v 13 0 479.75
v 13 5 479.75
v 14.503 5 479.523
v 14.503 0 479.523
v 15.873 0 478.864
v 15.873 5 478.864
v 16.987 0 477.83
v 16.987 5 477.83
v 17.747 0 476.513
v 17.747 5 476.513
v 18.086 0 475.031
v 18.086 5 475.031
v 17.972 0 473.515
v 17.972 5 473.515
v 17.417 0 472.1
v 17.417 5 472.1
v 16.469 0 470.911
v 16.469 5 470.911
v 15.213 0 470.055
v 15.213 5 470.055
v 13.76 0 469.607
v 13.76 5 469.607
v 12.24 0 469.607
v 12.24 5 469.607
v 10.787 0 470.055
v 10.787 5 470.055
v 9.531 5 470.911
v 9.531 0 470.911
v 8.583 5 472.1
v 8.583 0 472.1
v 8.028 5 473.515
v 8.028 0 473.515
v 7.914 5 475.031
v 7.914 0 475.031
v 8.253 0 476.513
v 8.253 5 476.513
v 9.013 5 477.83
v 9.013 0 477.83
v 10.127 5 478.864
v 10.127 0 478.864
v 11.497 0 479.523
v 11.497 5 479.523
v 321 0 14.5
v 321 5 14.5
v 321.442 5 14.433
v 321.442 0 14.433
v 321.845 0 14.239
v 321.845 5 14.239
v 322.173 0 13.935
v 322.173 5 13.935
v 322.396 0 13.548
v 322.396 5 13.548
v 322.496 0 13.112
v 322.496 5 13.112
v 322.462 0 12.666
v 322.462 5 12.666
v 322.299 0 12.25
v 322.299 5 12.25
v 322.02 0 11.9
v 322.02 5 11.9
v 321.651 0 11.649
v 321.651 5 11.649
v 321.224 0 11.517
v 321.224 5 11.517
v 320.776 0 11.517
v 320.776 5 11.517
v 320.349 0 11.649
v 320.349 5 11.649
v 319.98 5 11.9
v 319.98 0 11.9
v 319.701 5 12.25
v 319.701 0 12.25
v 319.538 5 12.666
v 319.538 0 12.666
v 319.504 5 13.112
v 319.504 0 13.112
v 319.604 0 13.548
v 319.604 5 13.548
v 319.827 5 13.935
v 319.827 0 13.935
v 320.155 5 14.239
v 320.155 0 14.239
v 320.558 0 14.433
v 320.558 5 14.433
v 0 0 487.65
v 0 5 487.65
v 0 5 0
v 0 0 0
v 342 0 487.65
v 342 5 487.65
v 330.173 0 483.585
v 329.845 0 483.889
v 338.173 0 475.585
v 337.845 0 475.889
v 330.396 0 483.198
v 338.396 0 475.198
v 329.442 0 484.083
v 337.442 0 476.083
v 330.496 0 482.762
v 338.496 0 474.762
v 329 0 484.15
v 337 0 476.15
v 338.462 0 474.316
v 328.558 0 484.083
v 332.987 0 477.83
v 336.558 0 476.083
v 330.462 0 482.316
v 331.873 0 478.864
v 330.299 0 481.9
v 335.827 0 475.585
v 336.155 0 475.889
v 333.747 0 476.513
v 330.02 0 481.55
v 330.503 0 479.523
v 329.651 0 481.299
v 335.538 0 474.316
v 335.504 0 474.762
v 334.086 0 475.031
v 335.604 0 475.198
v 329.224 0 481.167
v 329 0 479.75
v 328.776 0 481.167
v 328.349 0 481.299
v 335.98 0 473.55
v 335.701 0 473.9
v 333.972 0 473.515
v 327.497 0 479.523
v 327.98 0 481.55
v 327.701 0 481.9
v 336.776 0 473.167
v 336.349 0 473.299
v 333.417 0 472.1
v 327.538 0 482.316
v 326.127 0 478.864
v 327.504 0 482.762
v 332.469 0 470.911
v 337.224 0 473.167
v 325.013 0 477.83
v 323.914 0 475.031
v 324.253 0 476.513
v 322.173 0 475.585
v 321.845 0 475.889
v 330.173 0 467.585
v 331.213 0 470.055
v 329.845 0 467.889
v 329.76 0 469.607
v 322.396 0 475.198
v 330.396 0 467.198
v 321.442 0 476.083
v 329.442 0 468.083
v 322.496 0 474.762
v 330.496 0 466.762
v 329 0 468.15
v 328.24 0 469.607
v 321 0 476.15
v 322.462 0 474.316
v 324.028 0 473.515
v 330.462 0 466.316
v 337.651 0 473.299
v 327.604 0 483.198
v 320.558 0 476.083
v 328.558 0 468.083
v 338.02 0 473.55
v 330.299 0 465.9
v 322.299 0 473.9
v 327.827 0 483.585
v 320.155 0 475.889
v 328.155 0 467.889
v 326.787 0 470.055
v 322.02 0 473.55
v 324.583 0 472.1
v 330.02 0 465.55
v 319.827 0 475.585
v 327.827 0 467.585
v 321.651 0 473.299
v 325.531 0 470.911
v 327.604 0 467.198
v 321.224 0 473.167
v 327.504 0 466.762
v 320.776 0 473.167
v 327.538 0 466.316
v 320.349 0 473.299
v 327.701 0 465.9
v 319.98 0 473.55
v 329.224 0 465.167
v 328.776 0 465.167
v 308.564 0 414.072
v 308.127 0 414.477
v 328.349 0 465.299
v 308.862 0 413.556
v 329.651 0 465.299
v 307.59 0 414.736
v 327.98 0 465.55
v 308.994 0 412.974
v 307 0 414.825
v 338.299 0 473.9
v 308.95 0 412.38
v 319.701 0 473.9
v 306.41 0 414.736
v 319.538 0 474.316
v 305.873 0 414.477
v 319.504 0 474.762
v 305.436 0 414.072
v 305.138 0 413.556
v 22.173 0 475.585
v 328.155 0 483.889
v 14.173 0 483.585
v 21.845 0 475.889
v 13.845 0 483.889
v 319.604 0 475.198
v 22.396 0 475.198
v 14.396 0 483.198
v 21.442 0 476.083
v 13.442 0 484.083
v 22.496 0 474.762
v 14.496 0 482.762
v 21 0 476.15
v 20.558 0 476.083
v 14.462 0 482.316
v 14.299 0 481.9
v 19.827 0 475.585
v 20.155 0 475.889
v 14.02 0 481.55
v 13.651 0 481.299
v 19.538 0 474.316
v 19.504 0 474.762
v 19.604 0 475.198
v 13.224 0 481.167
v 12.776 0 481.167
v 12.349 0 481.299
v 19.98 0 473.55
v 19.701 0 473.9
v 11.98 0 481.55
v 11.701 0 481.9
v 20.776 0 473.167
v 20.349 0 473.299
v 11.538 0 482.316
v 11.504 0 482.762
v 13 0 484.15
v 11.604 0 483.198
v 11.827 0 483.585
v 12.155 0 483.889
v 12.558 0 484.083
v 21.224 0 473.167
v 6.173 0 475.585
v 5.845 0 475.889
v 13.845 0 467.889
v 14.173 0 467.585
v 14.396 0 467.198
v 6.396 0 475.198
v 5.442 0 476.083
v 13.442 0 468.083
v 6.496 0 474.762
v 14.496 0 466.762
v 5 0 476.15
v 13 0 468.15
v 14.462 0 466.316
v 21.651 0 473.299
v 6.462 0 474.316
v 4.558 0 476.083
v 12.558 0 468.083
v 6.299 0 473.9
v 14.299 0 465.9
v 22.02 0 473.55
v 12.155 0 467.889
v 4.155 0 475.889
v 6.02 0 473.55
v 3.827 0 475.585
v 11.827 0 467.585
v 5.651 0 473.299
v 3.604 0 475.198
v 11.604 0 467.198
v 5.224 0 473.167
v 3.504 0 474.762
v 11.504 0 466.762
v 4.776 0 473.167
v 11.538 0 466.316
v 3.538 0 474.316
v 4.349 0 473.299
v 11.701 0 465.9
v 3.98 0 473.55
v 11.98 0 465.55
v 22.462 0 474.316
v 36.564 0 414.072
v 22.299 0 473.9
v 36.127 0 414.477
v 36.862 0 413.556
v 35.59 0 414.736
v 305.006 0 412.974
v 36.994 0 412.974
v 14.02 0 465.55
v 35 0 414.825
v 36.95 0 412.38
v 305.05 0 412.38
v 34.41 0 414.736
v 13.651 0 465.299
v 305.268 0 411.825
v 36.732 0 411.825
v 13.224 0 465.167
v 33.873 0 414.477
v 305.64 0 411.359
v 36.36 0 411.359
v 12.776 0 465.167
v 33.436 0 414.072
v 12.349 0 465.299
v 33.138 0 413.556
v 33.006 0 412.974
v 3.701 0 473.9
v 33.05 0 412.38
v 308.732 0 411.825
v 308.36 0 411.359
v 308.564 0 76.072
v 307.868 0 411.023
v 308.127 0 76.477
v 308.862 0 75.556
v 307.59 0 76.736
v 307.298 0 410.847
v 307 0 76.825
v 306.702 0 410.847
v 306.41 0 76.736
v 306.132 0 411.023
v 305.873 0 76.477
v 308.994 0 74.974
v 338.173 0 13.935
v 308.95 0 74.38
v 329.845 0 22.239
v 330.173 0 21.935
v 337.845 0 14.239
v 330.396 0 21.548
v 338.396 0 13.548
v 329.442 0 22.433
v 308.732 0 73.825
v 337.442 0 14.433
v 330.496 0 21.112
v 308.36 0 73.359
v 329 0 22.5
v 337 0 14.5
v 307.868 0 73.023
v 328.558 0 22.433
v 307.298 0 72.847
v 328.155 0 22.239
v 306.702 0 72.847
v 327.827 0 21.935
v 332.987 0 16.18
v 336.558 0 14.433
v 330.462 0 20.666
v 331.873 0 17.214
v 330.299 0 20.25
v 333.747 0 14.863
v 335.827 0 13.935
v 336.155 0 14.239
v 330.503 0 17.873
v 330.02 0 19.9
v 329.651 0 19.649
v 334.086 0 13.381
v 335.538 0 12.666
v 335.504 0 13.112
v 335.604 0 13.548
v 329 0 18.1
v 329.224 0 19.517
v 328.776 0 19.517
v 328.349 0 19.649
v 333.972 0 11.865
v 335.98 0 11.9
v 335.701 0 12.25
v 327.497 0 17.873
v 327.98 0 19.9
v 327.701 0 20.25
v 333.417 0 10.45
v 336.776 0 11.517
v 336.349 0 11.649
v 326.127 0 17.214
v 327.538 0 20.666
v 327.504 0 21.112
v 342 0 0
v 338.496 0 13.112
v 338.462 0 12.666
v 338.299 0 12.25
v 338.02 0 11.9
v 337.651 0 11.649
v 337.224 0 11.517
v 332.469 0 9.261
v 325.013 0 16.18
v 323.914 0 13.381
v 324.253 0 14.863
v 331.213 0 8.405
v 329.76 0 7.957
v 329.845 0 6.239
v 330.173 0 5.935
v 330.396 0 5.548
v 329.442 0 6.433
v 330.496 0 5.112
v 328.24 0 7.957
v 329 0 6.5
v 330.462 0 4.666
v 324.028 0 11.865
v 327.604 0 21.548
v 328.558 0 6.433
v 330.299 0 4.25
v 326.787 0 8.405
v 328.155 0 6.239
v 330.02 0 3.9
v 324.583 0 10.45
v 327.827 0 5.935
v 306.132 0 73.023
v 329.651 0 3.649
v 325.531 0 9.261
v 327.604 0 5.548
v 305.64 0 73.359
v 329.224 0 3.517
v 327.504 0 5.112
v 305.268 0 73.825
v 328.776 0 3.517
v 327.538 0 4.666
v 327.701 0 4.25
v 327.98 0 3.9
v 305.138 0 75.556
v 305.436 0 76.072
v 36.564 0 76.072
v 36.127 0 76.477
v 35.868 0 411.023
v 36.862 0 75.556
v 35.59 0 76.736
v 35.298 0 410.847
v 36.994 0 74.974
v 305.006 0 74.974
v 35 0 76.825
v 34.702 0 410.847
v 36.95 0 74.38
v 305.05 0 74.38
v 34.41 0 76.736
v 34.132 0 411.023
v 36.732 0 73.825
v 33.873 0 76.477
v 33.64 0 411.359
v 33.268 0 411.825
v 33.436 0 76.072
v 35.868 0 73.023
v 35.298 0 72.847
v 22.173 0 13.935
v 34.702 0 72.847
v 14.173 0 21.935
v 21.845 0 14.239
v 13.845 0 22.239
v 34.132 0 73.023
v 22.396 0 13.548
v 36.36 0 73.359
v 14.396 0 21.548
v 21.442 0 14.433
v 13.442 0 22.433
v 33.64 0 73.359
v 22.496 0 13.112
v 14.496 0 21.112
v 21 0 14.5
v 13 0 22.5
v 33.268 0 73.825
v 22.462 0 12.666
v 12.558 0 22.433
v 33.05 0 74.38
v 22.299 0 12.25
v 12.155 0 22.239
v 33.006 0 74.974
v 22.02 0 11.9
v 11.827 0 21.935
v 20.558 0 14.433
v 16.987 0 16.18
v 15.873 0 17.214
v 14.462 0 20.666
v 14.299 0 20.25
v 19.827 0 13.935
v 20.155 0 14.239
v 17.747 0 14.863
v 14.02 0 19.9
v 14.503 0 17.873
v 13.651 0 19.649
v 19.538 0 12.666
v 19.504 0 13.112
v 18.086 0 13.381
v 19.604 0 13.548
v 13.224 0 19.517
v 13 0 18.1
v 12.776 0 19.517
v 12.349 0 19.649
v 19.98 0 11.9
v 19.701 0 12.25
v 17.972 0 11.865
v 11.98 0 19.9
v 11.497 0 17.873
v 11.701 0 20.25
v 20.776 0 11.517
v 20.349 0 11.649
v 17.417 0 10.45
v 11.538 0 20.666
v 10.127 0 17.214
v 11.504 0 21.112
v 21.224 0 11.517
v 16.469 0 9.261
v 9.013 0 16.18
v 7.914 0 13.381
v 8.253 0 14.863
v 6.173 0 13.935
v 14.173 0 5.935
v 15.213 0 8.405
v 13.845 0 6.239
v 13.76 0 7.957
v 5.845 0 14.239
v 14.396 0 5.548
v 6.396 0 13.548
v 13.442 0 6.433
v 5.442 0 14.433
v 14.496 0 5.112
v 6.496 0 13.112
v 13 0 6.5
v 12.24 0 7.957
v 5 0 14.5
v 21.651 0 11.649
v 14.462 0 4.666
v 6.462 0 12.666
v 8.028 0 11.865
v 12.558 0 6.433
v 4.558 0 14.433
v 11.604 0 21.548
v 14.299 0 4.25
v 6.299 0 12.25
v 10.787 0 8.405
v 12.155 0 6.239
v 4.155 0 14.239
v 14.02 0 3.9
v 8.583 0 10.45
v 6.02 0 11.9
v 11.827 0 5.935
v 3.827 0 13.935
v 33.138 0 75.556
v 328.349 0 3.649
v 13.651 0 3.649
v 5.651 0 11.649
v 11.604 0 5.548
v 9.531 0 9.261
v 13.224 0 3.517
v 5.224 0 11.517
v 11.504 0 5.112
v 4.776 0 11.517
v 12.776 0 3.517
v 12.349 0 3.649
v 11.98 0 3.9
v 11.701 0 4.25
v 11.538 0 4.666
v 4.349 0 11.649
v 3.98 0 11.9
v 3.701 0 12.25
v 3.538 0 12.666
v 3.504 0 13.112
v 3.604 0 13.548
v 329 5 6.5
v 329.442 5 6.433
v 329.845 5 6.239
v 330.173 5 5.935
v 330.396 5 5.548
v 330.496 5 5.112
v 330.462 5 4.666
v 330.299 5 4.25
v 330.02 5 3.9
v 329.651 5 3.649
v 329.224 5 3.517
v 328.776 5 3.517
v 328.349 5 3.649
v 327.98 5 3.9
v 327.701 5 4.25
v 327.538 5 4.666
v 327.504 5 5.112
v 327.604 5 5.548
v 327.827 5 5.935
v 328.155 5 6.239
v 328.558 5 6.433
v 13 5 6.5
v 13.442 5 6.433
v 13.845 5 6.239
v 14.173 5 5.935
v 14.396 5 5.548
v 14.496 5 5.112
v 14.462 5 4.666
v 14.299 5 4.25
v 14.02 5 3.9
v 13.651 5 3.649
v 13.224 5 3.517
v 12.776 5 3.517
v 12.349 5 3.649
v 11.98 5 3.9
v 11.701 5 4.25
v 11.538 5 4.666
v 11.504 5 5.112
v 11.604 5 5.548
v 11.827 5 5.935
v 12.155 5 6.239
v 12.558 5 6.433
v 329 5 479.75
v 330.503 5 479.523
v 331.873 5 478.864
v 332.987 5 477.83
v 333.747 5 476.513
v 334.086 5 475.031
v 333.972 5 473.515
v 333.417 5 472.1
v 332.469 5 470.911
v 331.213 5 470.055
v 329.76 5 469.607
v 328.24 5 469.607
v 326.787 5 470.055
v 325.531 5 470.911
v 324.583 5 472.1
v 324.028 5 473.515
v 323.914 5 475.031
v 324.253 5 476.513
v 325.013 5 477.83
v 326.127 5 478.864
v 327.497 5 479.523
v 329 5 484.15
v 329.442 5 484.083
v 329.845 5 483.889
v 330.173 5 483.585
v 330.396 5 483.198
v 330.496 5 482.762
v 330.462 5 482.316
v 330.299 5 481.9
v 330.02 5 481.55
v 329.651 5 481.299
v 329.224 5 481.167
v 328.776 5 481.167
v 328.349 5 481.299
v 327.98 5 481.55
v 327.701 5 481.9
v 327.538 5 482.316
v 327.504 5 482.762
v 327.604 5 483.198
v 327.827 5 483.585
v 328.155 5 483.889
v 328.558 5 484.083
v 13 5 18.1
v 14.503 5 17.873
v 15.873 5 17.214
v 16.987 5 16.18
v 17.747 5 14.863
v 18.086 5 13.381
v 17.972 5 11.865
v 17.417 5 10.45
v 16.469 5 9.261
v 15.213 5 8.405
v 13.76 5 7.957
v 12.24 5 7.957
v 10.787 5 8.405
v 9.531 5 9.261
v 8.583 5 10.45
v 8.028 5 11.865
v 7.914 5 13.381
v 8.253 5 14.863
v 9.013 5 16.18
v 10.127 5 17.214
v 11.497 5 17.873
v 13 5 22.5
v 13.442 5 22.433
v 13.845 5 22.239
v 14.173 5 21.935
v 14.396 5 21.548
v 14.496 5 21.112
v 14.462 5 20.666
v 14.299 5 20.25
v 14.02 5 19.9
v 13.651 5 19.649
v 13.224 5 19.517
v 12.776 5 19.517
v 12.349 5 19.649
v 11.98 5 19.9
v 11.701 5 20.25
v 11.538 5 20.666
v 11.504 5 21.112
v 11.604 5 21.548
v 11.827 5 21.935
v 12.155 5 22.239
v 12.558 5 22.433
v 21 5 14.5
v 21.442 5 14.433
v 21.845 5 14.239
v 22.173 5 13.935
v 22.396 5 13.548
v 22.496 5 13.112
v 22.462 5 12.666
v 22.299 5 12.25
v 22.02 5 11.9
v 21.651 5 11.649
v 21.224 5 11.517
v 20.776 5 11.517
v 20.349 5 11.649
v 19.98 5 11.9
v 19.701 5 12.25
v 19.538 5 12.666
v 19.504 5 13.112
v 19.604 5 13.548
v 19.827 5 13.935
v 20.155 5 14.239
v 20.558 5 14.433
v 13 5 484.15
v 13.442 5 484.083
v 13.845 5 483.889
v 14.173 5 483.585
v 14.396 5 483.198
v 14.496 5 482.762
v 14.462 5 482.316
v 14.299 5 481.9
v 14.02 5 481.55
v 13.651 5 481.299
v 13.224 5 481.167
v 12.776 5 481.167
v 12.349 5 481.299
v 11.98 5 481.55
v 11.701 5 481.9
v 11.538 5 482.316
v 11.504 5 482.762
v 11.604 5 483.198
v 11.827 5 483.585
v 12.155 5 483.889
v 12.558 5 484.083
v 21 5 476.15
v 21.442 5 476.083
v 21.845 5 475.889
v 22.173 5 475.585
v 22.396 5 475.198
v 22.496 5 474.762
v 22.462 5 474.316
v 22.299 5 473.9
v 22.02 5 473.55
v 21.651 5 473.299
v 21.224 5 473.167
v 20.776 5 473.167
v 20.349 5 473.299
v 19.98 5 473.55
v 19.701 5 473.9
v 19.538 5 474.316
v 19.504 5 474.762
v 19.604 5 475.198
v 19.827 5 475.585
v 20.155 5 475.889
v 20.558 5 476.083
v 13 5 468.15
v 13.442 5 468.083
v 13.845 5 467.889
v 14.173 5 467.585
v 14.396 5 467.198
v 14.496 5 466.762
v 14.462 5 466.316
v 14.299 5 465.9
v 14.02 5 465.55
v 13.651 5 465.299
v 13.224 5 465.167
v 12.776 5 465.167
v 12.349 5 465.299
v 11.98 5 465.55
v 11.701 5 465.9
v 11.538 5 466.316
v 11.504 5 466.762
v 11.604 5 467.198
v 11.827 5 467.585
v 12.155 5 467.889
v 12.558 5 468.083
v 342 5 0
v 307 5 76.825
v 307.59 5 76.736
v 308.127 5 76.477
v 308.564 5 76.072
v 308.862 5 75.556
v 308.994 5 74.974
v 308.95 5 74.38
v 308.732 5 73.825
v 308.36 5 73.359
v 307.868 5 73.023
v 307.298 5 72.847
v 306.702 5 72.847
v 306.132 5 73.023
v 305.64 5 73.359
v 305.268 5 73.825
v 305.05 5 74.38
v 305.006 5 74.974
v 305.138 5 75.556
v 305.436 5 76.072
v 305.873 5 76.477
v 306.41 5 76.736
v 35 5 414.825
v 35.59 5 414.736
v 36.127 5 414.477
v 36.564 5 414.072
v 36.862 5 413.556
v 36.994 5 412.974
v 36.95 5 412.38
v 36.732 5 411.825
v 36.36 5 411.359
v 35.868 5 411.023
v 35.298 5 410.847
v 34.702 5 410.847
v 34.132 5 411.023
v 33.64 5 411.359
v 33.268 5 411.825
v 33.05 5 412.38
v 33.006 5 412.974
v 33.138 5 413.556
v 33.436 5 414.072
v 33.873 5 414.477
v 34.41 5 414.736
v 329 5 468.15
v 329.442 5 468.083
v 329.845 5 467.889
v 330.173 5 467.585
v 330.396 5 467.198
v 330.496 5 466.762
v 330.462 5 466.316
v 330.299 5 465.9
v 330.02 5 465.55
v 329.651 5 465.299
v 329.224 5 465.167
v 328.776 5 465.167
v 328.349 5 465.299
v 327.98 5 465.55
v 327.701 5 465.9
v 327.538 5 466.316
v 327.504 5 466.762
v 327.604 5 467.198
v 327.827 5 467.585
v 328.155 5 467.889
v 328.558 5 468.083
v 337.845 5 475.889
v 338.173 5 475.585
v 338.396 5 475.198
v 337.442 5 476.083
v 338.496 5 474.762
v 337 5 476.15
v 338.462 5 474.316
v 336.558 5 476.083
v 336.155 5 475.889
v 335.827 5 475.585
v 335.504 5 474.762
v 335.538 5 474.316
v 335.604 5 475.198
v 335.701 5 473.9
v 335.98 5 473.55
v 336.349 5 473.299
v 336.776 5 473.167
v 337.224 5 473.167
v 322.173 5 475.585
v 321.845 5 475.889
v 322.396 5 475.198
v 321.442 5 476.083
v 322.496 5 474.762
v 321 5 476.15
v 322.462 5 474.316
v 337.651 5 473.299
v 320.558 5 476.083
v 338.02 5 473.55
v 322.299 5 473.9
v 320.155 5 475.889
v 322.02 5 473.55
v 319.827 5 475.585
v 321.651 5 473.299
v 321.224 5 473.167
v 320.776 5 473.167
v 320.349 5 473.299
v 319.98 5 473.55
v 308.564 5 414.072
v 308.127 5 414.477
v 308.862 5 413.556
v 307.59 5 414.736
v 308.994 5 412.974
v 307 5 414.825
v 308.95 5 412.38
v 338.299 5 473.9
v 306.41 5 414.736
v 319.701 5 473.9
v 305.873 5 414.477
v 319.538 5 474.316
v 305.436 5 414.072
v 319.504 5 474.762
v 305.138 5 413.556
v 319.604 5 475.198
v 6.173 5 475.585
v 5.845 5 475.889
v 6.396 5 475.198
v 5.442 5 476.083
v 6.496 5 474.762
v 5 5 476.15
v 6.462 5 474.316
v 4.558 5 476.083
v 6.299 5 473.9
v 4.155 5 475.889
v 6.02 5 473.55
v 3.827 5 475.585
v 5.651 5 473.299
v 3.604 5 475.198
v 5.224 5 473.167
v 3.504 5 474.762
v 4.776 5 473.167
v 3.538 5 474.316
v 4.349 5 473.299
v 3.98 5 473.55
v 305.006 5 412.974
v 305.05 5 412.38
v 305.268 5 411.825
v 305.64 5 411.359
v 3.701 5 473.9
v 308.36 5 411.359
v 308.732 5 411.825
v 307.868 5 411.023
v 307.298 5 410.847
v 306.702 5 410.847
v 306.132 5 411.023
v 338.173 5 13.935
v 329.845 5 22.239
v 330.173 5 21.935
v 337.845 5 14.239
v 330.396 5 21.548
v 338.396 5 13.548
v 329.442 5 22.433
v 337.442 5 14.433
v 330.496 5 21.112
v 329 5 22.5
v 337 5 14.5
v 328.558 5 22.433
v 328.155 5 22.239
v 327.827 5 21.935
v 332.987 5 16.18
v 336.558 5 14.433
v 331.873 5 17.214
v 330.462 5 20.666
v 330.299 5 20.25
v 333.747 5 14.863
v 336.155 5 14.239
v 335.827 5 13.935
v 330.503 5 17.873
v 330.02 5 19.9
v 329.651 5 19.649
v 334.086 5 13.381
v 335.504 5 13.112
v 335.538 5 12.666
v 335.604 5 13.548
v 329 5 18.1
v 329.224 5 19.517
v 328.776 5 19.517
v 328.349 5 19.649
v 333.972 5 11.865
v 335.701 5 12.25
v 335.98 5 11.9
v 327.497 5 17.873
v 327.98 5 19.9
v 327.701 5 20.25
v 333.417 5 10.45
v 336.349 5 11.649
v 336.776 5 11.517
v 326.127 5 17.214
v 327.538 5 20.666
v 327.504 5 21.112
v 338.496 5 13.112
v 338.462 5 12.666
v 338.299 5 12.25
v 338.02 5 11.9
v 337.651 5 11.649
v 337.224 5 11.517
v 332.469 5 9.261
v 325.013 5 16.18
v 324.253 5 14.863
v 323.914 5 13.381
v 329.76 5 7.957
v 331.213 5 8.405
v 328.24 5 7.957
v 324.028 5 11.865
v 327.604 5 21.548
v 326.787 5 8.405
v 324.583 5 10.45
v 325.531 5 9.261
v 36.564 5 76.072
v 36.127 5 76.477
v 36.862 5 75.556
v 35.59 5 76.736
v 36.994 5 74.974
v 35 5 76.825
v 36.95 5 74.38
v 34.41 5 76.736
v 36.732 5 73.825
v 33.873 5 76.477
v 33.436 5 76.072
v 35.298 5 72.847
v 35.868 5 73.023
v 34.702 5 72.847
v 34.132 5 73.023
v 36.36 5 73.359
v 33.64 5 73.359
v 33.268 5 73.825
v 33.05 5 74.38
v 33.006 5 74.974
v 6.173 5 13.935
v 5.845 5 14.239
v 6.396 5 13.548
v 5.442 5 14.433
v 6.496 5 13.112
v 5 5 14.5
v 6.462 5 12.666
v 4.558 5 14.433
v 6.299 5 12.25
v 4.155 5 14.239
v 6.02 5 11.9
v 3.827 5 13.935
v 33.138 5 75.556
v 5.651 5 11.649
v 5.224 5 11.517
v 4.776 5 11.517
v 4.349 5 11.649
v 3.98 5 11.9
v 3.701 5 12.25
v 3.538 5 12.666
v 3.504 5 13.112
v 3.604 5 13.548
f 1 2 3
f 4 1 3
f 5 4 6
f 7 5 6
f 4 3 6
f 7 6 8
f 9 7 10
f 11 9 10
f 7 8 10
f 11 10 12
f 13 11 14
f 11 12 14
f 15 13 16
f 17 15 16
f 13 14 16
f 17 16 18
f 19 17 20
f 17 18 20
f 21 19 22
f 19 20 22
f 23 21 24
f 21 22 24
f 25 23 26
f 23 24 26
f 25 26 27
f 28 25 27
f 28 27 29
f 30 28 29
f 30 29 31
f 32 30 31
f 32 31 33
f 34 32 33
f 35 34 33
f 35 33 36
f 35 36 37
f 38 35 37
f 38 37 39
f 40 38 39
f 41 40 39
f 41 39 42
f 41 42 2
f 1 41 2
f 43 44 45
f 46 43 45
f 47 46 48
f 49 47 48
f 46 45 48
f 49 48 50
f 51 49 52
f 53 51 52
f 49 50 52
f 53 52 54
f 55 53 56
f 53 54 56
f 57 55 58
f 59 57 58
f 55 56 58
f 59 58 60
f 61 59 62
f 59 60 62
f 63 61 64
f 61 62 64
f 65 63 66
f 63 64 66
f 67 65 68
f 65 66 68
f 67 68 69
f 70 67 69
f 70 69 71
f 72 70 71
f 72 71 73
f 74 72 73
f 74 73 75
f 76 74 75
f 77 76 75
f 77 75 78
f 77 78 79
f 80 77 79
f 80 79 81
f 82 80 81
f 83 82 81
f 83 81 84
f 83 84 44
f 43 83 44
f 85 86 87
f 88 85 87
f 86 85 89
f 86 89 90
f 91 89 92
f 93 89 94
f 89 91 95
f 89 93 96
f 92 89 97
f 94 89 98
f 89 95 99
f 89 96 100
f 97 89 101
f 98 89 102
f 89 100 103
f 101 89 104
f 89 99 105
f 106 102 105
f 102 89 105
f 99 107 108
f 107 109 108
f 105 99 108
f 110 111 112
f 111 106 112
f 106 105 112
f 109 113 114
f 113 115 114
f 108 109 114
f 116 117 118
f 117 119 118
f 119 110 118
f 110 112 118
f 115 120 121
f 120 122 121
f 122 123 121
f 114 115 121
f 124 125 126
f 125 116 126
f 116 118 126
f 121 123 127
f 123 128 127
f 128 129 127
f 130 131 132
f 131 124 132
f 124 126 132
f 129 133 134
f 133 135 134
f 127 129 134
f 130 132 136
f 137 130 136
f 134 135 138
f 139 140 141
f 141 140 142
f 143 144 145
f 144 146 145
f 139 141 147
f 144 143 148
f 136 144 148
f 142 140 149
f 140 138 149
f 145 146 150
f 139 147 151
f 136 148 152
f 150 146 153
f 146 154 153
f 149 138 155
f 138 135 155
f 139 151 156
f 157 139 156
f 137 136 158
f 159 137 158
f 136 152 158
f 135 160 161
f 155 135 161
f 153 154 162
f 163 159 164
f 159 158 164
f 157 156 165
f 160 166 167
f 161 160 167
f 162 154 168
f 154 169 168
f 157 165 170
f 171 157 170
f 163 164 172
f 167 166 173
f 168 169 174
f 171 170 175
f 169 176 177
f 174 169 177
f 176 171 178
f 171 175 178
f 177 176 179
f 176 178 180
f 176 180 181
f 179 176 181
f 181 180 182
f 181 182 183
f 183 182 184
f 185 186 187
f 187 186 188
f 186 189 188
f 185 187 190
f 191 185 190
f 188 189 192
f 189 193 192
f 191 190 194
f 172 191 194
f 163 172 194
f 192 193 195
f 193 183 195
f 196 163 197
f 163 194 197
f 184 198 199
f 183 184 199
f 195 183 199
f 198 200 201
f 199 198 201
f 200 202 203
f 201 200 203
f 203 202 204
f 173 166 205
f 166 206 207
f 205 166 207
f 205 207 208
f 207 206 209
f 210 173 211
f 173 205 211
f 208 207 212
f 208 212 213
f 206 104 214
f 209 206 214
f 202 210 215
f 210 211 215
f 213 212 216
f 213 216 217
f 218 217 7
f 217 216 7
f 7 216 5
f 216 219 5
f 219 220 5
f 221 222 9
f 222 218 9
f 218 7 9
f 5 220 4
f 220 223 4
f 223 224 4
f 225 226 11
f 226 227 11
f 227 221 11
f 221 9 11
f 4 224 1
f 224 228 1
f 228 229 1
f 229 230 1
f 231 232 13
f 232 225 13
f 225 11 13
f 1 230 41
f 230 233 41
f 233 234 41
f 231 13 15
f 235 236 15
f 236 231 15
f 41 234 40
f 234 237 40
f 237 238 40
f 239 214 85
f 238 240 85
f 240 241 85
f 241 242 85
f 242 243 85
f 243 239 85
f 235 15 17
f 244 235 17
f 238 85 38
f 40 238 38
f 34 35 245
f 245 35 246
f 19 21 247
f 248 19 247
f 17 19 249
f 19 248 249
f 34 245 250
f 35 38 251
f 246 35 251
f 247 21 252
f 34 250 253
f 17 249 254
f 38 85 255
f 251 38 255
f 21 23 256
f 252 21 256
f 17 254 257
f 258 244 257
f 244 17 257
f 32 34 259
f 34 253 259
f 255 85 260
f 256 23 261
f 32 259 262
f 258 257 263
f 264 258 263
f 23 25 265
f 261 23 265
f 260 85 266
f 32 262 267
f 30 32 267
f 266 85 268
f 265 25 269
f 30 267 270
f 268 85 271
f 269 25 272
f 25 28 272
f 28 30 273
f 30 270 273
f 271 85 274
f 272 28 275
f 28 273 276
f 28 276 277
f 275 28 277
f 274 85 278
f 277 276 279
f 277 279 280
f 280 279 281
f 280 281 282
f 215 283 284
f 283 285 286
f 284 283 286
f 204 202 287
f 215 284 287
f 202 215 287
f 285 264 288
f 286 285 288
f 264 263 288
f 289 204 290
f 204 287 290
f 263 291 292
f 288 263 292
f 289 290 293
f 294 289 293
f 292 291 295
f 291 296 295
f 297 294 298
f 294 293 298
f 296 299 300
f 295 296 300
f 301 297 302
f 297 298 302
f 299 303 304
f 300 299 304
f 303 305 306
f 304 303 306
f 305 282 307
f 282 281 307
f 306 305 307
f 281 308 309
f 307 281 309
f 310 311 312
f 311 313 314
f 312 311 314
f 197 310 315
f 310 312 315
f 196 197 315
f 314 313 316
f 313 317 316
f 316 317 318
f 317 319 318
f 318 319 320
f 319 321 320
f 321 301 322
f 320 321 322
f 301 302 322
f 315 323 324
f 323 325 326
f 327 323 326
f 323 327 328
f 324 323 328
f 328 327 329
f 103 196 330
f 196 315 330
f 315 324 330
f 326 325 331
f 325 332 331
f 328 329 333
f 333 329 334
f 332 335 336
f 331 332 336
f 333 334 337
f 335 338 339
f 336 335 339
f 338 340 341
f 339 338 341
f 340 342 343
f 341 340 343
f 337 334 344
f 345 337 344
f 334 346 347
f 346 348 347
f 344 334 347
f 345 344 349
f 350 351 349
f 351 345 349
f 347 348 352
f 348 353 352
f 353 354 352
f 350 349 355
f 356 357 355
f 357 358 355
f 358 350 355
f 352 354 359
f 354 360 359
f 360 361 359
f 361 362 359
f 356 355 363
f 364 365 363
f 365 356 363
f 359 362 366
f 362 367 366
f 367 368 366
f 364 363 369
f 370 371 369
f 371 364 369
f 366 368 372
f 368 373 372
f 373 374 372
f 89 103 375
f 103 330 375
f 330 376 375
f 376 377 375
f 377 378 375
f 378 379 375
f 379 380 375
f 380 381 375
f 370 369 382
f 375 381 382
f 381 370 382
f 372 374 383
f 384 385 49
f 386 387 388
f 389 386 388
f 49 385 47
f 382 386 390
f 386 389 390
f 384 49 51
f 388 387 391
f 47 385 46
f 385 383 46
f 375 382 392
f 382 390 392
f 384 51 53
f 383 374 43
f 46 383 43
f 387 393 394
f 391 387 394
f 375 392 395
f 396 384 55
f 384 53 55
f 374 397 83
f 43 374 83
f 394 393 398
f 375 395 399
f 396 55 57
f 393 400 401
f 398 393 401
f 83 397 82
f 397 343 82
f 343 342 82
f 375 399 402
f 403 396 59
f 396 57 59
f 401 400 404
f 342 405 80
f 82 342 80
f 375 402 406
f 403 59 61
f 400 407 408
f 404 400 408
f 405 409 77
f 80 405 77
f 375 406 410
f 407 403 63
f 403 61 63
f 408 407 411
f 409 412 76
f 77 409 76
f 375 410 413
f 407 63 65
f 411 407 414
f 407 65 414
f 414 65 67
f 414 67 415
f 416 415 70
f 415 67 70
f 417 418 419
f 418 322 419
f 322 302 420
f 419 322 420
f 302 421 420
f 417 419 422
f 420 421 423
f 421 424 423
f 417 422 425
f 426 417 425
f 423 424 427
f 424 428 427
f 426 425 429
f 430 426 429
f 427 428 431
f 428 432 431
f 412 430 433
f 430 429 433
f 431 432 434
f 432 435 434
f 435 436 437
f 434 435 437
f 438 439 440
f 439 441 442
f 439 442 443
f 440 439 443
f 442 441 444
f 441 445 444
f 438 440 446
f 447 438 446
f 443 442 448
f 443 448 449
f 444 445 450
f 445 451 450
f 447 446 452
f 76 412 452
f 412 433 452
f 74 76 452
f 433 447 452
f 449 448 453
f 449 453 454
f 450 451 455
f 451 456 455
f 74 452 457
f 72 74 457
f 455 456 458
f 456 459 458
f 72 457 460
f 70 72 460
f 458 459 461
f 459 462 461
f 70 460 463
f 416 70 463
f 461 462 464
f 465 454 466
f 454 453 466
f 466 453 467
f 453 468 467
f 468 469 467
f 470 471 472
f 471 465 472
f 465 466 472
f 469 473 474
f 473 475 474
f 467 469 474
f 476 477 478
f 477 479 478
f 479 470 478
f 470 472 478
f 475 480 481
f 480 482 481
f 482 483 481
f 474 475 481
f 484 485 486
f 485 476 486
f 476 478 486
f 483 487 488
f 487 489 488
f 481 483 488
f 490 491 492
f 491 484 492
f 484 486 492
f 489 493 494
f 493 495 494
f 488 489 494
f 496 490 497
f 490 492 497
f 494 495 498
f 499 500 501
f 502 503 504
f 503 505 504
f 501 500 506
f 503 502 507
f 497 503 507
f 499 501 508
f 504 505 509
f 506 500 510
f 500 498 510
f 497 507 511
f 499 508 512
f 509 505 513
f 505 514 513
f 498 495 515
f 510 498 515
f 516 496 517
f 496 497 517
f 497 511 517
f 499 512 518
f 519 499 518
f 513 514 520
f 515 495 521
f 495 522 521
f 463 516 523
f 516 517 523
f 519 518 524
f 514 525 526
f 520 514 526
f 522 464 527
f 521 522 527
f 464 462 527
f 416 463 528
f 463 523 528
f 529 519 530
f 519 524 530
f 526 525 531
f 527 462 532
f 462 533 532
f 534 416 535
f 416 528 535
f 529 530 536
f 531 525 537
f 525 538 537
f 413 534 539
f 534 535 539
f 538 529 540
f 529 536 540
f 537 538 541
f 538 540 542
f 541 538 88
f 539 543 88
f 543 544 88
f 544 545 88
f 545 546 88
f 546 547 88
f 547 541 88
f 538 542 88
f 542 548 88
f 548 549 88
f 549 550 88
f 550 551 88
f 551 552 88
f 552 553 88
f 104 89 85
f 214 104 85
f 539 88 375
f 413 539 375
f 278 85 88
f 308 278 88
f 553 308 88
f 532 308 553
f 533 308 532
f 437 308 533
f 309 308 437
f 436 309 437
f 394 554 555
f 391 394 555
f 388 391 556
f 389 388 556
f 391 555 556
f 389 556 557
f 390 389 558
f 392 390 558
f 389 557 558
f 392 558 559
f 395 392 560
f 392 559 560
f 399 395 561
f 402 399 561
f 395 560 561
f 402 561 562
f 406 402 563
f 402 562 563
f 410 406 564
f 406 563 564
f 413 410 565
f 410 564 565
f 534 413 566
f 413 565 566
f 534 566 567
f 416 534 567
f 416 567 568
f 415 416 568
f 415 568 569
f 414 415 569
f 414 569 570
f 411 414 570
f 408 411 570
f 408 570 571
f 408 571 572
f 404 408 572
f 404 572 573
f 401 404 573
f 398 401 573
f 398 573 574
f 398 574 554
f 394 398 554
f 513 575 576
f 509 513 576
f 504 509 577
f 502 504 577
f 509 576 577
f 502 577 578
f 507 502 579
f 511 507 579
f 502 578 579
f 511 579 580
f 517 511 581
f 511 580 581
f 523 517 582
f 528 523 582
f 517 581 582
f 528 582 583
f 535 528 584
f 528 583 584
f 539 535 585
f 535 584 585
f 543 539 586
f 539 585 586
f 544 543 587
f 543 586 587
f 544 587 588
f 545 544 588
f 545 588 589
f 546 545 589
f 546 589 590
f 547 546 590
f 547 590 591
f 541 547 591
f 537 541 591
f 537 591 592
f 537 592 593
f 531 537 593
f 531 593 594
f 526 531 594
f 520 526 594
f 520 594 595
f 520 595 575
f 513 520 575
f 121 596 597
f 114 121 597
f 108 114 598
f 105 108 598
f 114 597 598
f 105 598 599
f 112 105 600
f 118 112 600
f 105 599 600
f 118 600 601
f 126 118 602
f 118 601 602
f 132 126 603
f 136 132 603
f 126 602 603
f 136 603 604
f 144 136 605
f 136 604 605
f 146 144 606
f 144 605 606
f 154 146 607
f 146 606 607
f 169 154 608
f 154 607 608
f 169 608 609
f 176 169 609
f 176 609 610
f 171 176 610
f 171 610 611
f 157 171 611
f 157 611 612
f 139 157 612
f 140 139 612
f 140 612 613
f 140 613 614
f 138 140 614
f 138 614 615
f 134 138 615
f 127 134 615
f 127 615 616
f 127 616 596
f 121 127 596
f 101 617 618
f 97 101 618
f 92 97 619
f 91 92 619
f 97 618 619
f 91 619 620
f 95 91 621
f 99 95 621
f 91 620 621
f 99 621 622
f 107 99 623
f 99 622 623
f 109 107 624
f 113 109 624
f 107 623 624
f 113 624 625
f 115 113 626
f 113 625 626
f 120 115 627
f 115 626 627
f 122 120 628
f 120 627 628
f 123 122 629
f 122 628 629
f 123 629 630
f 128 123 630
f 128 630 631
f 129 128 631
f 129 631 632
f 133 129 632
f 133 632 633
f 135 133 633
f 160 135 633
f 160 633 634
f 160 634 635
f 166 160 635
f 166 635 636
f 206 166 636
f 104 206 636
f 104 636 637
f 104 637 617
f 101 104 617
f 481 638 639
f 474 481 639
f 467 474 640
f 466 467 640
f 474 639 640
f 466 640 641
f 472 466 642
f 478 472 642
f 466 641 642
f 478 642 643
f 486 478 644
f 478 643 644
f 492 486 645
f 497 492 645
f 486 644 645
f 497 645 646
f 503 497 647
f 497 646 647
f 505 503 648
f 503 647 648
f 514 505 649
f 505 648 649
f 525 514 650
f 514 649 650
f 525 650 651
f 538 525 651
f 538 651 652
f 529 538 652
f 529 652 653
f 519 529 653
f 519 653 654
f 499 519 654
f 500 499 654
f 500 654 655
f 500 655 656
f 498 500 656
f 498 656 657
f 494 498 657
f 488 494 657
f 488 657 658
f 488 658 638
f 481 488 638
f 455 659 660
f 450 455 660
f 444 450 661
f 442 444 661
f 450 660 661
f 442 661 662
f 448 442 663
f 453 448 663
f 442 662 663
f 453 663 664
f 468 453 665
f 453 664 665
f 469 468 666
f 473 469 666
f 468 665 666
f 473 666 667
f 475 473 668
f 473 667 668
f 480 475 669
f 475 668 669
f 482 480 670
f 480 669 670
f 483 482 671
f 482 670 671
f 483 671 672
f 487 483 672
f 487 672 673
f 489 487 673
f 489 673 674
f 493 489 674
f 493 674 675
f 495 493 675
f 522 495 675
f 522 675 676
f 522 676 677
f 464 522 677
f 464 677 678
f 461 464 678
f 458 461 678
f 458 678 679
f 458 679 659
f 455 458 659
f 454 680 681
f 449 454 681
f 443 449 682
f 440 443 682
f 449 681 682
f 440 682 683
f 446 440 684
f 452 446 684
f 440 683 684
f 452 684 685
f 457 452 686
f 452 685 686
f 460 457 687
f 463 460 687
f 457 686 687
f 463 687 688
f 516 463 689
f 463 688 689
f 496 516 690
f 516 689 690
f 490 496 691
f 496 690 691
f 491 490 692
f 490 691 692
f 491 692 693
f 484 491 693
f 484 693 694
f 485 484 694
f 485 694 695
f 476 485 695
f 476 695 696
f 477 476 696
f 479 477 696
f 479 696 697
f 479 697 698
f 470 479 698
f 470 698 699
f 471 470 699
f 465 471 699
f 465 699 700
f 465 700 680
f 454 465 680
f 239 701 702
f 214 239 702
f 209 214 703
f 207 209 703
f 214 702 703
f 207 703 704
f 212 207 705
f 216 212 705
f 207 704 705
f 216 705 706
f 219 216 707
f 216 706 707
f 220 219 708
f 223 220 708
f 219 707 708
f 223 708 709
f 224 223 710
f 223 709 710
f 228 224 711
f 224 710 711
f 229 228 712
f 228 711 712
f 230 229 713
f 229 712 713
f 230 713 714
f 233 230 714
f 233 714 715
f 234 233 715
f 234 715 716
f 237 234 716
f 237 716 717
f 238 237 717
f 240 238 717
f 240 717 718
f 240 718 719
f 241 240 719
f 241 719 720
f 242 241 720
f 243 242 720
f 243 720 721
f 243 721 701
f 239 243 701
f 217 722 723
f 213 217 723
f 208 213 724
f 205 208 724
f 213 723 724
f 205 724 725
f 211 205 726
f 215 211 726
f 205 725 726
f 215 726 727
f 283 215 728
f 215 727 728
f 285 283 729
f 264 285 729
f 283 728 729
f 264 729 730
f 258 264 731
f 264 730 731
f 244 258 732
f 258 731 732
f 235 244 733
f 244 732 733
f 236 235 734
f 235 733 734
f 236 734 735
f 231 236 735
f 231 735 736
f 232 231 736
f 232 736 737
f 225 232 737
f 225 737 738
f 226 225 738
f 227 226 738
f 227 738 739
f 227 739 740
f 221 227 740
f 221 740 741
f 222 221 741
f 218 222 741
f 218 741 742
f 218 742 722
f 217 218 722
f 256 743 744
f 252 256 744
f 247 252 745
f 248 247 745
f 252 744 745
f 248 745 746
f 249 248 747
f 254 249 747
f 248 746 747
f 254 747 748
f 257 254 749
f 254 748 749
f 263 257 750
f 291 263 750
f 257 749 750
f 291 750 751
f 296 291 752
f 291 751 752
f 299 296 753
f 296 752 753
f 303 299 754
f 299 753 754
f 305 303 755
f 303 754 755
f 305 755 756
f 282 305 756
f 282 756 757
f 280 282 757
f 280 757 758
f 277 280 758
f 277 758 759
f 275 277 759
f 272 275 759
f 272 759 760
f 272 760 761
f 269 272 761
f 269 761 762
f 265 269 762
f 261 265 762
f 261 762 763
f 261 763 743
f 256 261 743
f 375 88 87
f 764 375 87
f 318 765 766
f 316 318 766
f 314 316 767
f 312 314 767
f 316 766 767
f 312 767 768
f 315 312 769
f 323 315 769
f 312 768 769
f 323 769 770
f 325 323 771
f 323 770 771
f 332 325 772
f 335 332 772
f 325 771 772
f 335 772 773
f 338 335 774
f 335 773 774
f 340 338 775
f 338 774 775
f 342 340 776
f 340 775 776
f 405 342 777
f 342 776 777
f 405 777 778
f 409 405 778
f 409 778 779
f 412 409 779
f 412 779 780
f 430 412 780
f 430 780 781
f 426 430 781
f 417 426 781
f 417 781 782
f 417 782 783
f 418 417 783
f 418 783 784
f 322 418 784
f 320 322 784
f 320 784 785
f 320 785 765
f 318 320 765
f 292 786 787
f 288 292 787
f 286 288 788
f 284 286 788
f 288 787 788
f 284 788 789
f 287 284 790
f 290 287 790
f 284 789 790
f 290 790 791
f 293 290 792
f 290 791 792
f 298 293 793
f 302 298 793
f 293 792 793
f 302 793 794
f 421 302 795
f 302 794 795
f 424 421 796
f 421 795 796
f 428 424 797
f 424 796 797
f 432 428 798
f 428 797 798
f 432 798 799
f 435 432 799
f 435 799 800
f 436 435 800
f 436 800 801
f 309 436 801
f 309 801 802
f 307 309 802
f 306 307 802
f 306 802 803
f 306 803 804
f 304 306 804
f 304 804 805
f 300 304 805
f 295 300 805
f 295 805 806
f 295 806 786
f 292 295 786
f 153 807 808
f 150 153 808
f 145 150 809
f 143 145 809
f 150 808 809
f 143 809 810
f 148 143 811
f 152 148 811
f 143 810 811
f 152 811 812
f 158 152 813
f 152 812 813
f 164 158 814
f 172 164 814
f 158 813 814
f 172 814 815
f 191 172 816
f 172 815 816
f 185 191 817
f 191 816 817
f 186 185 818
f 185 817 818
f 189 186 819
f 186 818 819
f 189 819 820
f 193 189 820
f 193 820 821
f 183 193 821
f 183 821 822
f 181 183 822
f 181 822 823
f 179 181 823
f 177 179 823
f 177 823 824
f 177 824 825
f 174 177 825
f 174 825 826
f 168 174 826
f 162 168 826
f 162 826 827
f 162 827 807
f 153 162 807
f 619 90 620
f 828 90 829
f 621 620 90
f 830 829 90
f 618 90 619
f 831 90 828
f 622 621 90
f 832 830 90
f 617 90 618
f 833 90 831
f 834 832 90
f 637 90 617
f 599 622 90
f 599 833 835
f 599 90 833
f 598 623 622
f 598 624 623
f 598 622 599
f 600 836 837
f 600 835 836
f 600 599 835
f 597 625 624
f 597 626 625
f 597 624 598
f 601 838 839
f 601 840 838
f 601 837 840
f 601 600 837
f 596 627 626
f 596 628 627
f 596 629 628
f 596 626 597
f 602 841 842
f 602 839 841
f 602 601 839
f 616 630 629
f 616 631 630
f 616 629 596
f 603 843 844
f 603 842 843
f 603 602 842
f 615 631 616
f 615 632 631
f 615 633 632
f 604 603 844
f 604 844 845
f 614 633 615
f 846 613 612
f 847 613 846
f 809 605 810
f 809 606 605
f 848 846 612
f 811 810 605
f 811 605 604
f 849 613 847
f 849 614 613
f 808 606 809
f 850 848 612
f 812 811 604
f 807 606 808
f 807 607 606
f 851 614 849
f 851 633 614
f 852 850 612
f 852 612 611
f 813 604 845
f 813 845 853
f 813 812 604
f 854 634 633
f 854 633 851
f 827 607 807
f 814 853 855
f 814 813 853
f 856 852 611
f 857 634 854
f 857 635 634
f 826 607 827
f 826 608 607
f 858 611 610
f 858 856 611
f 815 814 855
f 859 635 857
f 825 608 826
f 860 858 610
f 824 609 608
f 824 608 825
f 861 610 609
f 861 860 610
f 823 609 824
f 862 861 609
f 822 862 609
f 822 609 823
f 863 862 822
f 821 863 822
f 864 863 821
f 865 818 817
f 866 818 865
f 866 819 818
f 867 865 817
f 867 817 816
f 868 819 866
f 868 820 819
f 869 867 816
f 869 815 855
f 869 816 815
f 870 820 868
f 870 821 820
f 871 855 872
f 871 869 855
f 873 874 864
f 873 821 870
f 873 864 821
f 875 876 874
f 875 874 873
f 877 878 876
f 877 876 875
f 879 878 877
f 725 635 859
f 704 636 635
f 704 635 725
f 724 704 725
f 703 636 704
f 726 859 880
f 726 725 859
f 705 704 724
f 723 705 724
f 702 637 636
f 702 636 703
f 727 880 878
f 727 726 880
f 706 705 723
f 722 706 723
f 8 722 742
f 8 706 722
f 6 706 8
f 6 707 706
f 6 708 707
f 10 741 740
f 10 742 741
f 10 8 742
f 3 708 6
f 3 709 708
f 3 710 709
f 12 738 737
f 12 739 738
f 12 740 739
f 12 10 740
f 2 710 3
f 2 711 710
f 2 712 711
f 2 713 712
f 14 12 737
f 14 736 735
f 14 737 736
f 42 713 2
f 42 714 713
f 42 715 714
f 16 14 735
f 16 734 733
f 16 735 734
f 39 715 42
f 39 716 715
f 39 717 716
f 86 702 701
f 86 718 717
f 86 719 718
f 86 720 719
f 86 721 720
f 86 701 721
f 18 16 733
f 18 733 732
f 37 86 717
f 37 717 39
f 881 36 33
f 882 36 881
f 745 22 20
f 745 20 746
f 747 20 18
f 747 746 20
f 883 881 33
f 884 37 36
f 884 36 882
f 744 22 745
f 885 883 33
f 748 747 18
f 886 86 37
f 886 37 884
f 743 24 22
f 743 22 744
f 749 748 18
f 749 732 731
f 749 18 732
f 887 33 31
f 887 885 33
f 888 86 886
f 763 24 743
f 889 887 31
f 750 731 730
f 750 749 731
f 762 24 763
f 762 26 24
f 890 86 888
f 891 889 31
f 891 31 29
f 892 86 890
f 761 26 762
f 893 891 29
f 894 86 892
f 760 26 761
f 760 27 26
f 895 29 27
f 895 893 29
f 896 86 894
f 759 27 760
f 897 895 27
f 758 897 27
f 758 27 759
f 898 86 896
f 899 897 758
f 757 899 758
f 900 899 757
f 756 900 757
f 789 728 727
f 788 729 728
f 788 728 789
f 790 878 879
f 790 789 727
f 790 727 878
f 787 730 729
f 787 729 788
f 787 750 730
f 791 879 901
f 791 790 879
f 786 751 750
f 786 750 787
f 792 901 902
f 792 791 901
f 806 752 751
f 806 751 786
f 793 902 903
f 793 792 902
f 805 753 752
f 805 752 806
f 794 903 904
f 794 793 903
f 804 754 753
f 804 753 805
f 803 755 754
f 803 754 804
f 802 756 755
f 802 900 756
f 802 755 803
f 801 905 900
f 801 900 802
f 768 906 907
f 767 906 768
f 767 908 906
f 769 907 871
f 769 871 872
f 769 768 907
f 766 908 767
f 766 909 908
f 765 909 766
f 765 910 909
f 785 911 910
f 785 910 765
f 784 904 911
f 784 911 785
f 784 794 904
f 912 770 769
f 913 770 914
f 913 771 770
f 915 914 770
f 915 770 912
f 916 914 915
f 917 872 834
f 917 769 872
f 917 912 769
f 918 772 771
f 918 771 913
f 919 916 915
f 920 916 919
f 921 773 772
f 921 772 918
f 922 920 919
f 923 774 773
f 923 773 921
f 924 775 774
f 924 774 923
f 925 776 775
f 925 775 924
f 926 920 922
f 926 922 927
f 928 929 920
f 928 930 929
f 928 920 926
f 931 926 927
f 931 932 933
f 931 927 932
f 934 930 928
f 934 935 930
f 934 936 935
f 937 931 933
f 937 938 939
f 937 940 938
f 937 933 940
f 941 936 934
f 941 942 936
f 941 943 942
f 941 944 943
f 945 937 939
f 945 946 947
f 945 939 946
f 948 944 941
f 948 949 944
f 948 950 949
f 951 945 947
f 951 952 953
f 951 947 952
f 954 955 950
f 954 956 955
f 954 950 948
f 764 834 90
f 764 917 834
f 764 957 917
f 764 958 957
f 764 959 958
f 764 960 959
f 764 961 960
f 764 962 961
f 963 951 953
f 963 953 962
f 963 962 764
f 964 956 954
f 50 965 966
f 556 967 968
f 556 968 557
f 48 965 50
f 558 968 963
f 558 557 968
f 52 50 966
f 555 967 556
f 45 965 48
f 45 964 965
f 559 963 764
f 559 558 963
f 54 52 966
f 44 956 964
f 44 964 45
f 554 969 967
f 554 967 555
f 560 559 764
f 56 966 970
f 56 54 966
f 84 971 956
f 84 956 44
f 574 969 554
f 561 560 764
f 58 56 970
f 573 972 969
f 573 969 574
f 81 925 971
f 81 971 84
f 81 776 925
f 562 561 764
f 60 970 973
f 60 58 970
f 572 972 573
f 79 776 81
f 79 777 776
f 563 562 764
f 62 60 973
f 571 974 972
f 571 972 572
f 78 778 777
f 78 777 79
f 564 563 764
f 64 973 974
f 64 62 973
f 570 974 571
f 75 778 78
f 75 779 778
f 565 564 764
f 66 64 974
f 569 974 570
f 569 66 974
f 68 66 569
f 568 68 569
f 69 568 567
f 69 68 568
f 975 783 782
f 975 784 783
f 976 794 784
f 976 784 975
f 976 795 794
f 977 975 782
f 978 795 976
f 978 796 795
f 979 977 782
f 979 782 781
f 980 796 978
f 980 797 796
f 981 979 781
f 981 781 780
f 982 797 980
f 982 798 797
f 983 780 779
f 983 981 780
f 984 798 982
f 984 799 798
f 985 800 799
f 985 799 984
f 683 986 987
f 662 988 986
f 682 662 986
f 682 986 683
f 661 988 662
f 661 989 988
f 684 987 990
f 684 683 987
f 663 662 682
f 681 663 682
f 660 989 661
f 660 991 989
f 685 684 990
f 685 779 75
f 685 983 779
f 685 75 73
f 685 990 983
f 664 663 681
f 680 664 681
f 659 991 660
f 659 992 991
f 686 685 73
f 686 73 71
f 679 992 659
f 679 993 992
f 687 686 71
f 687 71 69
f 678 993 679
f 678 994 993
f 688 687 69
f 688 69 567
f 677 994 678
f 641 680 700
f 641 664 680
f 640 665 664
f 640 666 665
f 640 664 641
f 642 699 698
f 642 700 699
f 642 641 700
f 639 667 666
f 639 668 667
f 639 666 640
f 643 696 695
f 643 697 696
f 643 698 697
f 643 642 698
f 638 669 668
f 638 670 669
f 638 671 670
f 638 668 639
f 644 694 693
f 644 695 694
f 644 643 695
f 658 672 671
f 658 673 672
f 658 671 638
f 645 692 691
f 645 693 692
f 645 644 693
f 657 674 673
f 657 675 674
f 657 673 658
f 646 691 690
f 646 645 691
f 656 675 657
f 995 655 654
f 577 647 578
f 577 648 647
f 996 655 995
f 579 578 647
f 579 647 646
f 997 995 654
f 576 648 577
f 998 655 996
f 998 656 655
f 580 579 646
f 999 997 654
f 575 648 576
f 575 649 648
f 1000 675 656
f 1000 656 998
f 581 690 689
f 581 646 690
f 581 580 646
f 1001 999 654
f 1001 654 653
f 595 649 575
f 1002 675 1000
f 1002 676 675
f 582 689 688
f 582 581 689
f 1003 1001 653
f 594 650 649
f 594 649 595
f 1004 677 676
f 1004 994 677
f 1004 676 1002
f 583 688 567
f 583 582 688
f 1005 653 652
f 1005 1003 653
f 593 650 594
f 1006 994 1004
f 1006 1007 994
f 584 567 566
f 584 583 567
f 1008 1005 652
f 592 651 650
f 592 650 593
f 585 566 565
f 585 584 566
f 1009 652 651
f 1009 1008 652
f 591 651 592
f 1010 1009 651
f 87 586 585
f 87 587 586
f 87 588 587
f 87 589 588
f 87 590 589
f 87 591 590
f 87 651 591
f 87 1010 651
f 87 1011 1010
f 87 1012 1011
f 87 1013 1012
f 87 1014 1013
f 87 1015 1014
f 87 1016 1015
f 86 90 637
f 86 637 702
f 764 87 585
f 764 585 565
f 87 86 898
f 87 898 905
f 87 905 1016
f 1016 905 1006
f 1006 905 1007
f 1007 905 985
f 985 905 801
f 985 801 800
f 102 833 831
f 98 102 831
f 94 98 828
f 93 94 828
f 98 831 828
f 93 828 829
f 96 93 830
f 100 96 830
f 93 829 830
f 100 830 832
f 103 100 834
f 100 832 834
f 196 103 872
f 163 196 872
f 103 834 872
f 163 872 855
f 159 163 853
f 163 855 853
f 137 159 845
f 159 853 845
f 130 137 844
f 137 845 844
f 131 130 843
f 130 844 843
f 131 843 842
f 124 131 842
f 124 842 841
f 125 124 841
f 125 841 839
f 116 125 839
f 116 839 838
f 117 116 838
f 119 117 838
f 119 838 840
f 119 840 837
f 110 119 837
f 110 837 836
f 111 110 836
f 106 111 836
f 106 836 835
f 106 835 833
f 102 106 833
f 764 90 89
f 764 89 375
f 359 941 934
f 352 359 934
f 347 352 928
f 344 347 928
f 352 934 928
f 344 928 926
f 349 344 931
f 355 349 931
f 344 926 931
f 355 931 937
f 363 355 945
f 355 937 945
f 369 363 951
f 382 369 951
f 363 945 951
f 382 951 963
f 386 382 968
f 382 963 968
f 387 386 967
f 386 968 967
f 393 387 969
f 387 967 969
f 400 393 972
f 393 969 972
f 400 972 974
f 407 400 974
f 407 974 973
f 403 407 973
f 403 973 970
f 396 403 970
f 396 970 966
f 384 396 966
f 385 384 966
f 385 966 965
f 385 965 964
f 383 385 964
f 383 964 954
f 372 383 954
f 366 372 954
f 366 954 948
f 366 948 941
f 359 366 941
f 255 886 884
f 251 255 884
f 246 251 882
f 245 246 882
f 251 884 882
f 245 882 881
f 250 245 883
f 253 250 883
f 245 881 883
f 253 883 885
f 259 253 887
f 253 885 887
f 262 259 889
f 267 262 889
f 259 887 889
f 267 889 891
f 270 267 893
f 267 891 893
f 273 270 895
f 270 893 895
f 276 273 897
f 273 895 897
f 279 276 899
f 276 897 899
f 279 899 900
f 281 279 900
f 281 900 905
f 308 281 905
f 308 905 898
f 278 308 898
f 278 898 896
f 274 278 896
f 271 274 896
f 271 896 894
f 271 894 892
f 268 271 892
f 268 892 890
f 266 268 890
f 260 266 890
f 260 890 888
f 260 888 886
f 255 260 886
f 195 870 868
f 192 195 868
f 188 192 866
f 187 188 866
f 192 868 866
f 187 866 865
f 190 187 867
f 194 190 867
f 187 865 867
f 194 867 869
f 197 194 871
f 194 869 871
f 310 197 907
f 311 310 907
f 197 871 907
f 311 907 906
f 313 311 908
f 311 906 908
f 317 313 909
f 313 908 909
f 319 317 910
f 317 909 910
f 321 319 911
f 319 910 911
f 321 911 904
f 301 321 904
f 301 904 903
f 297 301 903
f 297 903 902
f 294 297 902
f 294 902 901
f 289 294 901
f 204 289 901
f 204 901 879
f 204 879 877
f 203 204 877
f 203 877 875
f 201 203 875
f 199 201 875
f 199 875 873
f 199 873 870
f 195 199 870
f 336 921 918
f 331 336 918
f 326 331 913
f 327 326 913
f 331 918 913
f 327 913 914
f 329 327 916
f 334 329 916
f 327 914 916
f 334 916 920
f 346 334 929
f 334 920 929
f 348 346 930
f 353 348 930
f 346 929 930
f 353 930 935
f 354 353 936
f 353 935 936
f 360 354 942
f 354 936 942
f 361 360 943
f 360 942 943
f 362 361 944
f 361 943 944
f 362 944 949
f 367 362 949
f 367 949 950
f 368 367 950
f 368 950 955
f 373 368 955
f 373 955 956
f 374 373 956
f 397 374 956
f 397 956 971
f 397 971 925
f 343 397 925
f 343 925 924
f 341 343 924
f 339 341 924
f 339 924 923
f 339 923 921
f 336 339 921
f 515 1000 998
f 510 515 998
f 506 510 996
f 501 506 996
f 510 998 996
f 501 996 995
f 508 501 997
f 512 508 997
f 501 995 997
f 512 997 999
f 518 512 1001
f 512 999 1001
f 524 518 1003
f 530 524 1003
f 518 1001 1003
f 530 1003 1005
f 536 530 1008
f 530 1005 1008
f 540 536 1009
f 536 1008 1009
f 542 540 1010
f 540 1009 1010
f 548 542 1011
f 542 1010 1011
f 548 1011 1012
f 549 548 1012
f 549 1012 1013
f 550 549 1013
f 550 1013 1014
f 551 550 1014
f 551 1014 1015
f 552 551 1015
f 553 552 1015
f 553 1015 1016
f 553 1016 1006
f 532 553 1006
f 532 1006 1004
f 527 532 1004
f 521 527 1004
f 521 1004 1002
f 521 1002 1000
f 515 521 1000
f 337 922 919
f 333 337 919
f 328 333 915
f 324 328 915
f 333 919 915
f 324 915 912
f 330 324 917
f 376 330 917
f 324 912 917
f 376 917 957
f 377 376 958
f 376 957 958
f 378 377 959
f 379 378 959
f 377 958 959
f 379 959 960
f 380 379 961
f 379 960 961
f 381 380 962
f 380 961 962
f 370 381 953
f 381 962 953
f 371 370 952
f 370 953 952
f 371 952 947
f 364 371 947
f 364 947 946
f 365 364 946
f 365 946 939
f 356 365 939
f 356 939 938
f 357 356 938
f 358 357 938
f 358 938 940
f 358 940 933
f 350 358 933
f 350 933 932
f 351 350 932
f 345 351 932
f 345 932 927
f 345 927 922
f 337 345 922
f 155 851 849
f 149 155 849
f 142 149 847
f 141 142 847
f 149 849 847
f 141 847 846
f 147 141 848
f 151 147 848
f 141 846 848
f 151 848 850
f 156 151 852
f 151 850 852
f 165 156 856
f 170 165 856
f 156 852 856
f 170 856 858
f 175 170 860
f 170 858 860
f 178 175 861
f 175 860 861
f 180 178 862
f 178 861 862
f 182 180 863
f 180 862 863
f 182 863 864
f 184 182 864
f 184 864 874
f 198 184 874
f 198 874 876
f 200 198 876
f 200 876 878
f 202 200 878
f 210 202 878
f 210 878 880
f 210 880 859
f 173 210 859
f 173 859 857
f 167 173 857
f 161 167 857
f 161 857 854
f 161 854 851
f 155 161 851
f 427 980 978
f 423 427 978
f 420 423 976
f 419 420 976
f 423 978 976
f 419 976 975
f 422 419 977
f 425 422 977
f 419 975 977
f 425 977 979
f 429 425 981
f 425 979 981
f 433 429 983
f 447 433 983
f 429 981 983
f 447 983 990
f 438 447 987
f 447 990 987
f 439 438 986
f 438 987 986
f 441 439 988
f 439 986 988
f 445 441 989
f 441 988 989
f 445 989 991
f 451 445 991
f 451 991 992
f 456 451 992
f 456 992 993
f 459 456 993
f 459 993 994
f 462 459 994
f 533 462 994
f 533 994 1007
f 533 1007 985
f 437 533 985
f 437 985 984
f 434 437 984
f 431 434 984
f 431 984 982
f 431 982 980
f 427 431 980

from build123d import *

# Parameters (mm, degrees)
SKETCH1_W                             = 487.65
SKETCH1_H                             = 5
BOSS_EXTRUDE1_DEPTH                   = 342
THREADEDROD_HOLES_SKETCH2_R           = 5.1
THREADEDROD_HOLES_SKETCH2_R_2         = 1.5
THREADEDRODHOLES_CUT_EXTRUDE1_DEPTH   = 596.643788266
BASEOLATEMOUNTHOLESSKETCH2_R          = 2
BASEPLATEMOUNTHOLESCUT_EXTRUDE1_DEPTH = 596.643788266


with BuildPart() as part:
    # Sketch1 → Boss-Extrude1 (new body)
    with BuildSketch(Plane(origin=(0, 0, 0), x_dir=(0, 0, -1), z_dir=(1, 0, 0))):
        with Locations((-243.825, 2.5)):
            Rectangle(SKETCH1_W, SKETCH1_H)
    extrude(amount=BOSS_EXTRUDE1_DEPTH)

    # ThreadedRod'Holes-Sketch2 → ThreadedRodHoles-Cut-Extrude1 (cut, through all)
    with BuildSketch(Plane(origin=(0, 5, 0), x_dir=(1, 0, 0), z_dir=(0, 1, 0))):
        with Locations(Location((329, -13, 0), (0, 0, 270))):
            Circle(THREADEDROD_HOLES_SKETCH2_R)
        with Locations(Location((321, -13, 0), (0, 0, 270))):
            Circle(THREADEDROD_HOLES_SKETCH2_R_2)
        with Locations(Location((329, -5, 0), (0, 0, 270))):
            Circle(THREADEDROD_HOLES_SKETCH2_R_2)
        with Locations(Location((329, -21, 0), (0, 0, 270))):
            Circle(THREADEDROD_HOLES_SKETCH2_R_2)
        with Locations(Location((337, -13, 0), (0, 0, 270))):
            Circle(THREADEDROD_HOLES_SKETCH2_R_2)
        with Locations(Location((21, -13, 0), (0, 0, 270))):
            Circle(THREADEDROD_HOLES_SKETCH2_R_2)
        with Locations(Location((13, -21, 0), (0, 0, 270))):
            Circle(THREADEDROD_HOLES_SKETCH2_R_2)
        with Locations(Location((13, -5, 0), (0, 0, 270))):
            Circle(THREADEDROD_HOLES_SKETCH2_R_2)
        with Locations(Location((5, -13, 0), (0, 0, 270))):
            Circle(THREADEDROD_HOLES_SKETCH2_R_2)
        with Locations(Location((13, -13, 0), (0, 0, 270))):
            Circle(THREADEDROD_HOLES_SKETCH2_R)
        with Locations(Location((13, -482.65, 0), (0, 0, 270))):
            Circle(THREADEDROD_HOLES_SKETCH2_R_2)
        with Locations(Location((21, -474.65, 0), (0, 0, 270))):
            Circle(THREADEDROD_HOLES_SKETCH2_R_2)
        with Locations(Location((5, -474.65, 0), (0, 0, 270))):
            Circle(THREADEDROD_HOLES_SKETCH2_R_2)
        with Locations(Location((13, -466.65, 0), (0, 0, 270))):
            Circle(THREADEDROD_HOLES_SKETCH2_R_2)
        with Locations(Location((321, -474.65, 0), (0, 0, 270))):
            Circle(THREADEDROD_HOLES_SKETCH2_R_2)
        with Locations(Location((329, -482.65, 0), (0, 0, 270))):
            Circle(THREADEDROD_HOLES_SKETCH2_R_2)
        with Locations(Location((329, -466.65, 0), (0, 0, 270))):
            Circle(THREADEDROD_HOLES_SKETCH2_R_2)
        with Locations(Location((337, -474.65, 0), (0, 0, 270))):
            Circle(THREADEDROD_HOLES_SKETCH2_R_2)
        with Locations(Location((13, -474.65, 0), (0, 0, 270))):
            Circle(THREADEDROD_HOLES_SKETCH2_R)
        with Locations(Location((329, -474.65, 0), (0, 0, 270))):
            Circle(THREADEDROD_HOLES_SKETCH2_R)
    extrude(amount=-THREADEDRODHOLES_CUT_EXTRUDE1_DEPTH, mode=Mode.SUBTRACT)

    # BaseOlateMountHolesSketch2 → BasePlateMountHolesCut-Extrude1 (cut, through all)
    with BuildSketch(Plane(origin=(0, 5, 0), x_dir=(1, 0, 0), z_dir=(0, 1, 0))):
        with Locations(Location((35, -74.825, 0), (0, 0, 270))):
            Circle(BASEOLATEMOUNTHOLESSKETCH2_R)
        with Locations(Location((307, -74.825, 0), (0, 0, 270))):
            Circle(BASEOLATEMOUNTHOLESSKETCH2_R)
        with Locations(Location((307, -412.825, 0), (0, 0, 270))):
            Circle(BASEOLATEMOUNTHOLESSKETCH2_R)
        with Locations(Location((35, -412.825, 0), (0, 0, 270))):
            Circle(BASEOLATEMOUNTHOLESSKETCH2_R)
    extrude(amount=-BASEPLATEMOUNTHOLESCUT_EXTRUDE1_DEPTH, mode=Mode.SUBTRACT)


solid = part.part
